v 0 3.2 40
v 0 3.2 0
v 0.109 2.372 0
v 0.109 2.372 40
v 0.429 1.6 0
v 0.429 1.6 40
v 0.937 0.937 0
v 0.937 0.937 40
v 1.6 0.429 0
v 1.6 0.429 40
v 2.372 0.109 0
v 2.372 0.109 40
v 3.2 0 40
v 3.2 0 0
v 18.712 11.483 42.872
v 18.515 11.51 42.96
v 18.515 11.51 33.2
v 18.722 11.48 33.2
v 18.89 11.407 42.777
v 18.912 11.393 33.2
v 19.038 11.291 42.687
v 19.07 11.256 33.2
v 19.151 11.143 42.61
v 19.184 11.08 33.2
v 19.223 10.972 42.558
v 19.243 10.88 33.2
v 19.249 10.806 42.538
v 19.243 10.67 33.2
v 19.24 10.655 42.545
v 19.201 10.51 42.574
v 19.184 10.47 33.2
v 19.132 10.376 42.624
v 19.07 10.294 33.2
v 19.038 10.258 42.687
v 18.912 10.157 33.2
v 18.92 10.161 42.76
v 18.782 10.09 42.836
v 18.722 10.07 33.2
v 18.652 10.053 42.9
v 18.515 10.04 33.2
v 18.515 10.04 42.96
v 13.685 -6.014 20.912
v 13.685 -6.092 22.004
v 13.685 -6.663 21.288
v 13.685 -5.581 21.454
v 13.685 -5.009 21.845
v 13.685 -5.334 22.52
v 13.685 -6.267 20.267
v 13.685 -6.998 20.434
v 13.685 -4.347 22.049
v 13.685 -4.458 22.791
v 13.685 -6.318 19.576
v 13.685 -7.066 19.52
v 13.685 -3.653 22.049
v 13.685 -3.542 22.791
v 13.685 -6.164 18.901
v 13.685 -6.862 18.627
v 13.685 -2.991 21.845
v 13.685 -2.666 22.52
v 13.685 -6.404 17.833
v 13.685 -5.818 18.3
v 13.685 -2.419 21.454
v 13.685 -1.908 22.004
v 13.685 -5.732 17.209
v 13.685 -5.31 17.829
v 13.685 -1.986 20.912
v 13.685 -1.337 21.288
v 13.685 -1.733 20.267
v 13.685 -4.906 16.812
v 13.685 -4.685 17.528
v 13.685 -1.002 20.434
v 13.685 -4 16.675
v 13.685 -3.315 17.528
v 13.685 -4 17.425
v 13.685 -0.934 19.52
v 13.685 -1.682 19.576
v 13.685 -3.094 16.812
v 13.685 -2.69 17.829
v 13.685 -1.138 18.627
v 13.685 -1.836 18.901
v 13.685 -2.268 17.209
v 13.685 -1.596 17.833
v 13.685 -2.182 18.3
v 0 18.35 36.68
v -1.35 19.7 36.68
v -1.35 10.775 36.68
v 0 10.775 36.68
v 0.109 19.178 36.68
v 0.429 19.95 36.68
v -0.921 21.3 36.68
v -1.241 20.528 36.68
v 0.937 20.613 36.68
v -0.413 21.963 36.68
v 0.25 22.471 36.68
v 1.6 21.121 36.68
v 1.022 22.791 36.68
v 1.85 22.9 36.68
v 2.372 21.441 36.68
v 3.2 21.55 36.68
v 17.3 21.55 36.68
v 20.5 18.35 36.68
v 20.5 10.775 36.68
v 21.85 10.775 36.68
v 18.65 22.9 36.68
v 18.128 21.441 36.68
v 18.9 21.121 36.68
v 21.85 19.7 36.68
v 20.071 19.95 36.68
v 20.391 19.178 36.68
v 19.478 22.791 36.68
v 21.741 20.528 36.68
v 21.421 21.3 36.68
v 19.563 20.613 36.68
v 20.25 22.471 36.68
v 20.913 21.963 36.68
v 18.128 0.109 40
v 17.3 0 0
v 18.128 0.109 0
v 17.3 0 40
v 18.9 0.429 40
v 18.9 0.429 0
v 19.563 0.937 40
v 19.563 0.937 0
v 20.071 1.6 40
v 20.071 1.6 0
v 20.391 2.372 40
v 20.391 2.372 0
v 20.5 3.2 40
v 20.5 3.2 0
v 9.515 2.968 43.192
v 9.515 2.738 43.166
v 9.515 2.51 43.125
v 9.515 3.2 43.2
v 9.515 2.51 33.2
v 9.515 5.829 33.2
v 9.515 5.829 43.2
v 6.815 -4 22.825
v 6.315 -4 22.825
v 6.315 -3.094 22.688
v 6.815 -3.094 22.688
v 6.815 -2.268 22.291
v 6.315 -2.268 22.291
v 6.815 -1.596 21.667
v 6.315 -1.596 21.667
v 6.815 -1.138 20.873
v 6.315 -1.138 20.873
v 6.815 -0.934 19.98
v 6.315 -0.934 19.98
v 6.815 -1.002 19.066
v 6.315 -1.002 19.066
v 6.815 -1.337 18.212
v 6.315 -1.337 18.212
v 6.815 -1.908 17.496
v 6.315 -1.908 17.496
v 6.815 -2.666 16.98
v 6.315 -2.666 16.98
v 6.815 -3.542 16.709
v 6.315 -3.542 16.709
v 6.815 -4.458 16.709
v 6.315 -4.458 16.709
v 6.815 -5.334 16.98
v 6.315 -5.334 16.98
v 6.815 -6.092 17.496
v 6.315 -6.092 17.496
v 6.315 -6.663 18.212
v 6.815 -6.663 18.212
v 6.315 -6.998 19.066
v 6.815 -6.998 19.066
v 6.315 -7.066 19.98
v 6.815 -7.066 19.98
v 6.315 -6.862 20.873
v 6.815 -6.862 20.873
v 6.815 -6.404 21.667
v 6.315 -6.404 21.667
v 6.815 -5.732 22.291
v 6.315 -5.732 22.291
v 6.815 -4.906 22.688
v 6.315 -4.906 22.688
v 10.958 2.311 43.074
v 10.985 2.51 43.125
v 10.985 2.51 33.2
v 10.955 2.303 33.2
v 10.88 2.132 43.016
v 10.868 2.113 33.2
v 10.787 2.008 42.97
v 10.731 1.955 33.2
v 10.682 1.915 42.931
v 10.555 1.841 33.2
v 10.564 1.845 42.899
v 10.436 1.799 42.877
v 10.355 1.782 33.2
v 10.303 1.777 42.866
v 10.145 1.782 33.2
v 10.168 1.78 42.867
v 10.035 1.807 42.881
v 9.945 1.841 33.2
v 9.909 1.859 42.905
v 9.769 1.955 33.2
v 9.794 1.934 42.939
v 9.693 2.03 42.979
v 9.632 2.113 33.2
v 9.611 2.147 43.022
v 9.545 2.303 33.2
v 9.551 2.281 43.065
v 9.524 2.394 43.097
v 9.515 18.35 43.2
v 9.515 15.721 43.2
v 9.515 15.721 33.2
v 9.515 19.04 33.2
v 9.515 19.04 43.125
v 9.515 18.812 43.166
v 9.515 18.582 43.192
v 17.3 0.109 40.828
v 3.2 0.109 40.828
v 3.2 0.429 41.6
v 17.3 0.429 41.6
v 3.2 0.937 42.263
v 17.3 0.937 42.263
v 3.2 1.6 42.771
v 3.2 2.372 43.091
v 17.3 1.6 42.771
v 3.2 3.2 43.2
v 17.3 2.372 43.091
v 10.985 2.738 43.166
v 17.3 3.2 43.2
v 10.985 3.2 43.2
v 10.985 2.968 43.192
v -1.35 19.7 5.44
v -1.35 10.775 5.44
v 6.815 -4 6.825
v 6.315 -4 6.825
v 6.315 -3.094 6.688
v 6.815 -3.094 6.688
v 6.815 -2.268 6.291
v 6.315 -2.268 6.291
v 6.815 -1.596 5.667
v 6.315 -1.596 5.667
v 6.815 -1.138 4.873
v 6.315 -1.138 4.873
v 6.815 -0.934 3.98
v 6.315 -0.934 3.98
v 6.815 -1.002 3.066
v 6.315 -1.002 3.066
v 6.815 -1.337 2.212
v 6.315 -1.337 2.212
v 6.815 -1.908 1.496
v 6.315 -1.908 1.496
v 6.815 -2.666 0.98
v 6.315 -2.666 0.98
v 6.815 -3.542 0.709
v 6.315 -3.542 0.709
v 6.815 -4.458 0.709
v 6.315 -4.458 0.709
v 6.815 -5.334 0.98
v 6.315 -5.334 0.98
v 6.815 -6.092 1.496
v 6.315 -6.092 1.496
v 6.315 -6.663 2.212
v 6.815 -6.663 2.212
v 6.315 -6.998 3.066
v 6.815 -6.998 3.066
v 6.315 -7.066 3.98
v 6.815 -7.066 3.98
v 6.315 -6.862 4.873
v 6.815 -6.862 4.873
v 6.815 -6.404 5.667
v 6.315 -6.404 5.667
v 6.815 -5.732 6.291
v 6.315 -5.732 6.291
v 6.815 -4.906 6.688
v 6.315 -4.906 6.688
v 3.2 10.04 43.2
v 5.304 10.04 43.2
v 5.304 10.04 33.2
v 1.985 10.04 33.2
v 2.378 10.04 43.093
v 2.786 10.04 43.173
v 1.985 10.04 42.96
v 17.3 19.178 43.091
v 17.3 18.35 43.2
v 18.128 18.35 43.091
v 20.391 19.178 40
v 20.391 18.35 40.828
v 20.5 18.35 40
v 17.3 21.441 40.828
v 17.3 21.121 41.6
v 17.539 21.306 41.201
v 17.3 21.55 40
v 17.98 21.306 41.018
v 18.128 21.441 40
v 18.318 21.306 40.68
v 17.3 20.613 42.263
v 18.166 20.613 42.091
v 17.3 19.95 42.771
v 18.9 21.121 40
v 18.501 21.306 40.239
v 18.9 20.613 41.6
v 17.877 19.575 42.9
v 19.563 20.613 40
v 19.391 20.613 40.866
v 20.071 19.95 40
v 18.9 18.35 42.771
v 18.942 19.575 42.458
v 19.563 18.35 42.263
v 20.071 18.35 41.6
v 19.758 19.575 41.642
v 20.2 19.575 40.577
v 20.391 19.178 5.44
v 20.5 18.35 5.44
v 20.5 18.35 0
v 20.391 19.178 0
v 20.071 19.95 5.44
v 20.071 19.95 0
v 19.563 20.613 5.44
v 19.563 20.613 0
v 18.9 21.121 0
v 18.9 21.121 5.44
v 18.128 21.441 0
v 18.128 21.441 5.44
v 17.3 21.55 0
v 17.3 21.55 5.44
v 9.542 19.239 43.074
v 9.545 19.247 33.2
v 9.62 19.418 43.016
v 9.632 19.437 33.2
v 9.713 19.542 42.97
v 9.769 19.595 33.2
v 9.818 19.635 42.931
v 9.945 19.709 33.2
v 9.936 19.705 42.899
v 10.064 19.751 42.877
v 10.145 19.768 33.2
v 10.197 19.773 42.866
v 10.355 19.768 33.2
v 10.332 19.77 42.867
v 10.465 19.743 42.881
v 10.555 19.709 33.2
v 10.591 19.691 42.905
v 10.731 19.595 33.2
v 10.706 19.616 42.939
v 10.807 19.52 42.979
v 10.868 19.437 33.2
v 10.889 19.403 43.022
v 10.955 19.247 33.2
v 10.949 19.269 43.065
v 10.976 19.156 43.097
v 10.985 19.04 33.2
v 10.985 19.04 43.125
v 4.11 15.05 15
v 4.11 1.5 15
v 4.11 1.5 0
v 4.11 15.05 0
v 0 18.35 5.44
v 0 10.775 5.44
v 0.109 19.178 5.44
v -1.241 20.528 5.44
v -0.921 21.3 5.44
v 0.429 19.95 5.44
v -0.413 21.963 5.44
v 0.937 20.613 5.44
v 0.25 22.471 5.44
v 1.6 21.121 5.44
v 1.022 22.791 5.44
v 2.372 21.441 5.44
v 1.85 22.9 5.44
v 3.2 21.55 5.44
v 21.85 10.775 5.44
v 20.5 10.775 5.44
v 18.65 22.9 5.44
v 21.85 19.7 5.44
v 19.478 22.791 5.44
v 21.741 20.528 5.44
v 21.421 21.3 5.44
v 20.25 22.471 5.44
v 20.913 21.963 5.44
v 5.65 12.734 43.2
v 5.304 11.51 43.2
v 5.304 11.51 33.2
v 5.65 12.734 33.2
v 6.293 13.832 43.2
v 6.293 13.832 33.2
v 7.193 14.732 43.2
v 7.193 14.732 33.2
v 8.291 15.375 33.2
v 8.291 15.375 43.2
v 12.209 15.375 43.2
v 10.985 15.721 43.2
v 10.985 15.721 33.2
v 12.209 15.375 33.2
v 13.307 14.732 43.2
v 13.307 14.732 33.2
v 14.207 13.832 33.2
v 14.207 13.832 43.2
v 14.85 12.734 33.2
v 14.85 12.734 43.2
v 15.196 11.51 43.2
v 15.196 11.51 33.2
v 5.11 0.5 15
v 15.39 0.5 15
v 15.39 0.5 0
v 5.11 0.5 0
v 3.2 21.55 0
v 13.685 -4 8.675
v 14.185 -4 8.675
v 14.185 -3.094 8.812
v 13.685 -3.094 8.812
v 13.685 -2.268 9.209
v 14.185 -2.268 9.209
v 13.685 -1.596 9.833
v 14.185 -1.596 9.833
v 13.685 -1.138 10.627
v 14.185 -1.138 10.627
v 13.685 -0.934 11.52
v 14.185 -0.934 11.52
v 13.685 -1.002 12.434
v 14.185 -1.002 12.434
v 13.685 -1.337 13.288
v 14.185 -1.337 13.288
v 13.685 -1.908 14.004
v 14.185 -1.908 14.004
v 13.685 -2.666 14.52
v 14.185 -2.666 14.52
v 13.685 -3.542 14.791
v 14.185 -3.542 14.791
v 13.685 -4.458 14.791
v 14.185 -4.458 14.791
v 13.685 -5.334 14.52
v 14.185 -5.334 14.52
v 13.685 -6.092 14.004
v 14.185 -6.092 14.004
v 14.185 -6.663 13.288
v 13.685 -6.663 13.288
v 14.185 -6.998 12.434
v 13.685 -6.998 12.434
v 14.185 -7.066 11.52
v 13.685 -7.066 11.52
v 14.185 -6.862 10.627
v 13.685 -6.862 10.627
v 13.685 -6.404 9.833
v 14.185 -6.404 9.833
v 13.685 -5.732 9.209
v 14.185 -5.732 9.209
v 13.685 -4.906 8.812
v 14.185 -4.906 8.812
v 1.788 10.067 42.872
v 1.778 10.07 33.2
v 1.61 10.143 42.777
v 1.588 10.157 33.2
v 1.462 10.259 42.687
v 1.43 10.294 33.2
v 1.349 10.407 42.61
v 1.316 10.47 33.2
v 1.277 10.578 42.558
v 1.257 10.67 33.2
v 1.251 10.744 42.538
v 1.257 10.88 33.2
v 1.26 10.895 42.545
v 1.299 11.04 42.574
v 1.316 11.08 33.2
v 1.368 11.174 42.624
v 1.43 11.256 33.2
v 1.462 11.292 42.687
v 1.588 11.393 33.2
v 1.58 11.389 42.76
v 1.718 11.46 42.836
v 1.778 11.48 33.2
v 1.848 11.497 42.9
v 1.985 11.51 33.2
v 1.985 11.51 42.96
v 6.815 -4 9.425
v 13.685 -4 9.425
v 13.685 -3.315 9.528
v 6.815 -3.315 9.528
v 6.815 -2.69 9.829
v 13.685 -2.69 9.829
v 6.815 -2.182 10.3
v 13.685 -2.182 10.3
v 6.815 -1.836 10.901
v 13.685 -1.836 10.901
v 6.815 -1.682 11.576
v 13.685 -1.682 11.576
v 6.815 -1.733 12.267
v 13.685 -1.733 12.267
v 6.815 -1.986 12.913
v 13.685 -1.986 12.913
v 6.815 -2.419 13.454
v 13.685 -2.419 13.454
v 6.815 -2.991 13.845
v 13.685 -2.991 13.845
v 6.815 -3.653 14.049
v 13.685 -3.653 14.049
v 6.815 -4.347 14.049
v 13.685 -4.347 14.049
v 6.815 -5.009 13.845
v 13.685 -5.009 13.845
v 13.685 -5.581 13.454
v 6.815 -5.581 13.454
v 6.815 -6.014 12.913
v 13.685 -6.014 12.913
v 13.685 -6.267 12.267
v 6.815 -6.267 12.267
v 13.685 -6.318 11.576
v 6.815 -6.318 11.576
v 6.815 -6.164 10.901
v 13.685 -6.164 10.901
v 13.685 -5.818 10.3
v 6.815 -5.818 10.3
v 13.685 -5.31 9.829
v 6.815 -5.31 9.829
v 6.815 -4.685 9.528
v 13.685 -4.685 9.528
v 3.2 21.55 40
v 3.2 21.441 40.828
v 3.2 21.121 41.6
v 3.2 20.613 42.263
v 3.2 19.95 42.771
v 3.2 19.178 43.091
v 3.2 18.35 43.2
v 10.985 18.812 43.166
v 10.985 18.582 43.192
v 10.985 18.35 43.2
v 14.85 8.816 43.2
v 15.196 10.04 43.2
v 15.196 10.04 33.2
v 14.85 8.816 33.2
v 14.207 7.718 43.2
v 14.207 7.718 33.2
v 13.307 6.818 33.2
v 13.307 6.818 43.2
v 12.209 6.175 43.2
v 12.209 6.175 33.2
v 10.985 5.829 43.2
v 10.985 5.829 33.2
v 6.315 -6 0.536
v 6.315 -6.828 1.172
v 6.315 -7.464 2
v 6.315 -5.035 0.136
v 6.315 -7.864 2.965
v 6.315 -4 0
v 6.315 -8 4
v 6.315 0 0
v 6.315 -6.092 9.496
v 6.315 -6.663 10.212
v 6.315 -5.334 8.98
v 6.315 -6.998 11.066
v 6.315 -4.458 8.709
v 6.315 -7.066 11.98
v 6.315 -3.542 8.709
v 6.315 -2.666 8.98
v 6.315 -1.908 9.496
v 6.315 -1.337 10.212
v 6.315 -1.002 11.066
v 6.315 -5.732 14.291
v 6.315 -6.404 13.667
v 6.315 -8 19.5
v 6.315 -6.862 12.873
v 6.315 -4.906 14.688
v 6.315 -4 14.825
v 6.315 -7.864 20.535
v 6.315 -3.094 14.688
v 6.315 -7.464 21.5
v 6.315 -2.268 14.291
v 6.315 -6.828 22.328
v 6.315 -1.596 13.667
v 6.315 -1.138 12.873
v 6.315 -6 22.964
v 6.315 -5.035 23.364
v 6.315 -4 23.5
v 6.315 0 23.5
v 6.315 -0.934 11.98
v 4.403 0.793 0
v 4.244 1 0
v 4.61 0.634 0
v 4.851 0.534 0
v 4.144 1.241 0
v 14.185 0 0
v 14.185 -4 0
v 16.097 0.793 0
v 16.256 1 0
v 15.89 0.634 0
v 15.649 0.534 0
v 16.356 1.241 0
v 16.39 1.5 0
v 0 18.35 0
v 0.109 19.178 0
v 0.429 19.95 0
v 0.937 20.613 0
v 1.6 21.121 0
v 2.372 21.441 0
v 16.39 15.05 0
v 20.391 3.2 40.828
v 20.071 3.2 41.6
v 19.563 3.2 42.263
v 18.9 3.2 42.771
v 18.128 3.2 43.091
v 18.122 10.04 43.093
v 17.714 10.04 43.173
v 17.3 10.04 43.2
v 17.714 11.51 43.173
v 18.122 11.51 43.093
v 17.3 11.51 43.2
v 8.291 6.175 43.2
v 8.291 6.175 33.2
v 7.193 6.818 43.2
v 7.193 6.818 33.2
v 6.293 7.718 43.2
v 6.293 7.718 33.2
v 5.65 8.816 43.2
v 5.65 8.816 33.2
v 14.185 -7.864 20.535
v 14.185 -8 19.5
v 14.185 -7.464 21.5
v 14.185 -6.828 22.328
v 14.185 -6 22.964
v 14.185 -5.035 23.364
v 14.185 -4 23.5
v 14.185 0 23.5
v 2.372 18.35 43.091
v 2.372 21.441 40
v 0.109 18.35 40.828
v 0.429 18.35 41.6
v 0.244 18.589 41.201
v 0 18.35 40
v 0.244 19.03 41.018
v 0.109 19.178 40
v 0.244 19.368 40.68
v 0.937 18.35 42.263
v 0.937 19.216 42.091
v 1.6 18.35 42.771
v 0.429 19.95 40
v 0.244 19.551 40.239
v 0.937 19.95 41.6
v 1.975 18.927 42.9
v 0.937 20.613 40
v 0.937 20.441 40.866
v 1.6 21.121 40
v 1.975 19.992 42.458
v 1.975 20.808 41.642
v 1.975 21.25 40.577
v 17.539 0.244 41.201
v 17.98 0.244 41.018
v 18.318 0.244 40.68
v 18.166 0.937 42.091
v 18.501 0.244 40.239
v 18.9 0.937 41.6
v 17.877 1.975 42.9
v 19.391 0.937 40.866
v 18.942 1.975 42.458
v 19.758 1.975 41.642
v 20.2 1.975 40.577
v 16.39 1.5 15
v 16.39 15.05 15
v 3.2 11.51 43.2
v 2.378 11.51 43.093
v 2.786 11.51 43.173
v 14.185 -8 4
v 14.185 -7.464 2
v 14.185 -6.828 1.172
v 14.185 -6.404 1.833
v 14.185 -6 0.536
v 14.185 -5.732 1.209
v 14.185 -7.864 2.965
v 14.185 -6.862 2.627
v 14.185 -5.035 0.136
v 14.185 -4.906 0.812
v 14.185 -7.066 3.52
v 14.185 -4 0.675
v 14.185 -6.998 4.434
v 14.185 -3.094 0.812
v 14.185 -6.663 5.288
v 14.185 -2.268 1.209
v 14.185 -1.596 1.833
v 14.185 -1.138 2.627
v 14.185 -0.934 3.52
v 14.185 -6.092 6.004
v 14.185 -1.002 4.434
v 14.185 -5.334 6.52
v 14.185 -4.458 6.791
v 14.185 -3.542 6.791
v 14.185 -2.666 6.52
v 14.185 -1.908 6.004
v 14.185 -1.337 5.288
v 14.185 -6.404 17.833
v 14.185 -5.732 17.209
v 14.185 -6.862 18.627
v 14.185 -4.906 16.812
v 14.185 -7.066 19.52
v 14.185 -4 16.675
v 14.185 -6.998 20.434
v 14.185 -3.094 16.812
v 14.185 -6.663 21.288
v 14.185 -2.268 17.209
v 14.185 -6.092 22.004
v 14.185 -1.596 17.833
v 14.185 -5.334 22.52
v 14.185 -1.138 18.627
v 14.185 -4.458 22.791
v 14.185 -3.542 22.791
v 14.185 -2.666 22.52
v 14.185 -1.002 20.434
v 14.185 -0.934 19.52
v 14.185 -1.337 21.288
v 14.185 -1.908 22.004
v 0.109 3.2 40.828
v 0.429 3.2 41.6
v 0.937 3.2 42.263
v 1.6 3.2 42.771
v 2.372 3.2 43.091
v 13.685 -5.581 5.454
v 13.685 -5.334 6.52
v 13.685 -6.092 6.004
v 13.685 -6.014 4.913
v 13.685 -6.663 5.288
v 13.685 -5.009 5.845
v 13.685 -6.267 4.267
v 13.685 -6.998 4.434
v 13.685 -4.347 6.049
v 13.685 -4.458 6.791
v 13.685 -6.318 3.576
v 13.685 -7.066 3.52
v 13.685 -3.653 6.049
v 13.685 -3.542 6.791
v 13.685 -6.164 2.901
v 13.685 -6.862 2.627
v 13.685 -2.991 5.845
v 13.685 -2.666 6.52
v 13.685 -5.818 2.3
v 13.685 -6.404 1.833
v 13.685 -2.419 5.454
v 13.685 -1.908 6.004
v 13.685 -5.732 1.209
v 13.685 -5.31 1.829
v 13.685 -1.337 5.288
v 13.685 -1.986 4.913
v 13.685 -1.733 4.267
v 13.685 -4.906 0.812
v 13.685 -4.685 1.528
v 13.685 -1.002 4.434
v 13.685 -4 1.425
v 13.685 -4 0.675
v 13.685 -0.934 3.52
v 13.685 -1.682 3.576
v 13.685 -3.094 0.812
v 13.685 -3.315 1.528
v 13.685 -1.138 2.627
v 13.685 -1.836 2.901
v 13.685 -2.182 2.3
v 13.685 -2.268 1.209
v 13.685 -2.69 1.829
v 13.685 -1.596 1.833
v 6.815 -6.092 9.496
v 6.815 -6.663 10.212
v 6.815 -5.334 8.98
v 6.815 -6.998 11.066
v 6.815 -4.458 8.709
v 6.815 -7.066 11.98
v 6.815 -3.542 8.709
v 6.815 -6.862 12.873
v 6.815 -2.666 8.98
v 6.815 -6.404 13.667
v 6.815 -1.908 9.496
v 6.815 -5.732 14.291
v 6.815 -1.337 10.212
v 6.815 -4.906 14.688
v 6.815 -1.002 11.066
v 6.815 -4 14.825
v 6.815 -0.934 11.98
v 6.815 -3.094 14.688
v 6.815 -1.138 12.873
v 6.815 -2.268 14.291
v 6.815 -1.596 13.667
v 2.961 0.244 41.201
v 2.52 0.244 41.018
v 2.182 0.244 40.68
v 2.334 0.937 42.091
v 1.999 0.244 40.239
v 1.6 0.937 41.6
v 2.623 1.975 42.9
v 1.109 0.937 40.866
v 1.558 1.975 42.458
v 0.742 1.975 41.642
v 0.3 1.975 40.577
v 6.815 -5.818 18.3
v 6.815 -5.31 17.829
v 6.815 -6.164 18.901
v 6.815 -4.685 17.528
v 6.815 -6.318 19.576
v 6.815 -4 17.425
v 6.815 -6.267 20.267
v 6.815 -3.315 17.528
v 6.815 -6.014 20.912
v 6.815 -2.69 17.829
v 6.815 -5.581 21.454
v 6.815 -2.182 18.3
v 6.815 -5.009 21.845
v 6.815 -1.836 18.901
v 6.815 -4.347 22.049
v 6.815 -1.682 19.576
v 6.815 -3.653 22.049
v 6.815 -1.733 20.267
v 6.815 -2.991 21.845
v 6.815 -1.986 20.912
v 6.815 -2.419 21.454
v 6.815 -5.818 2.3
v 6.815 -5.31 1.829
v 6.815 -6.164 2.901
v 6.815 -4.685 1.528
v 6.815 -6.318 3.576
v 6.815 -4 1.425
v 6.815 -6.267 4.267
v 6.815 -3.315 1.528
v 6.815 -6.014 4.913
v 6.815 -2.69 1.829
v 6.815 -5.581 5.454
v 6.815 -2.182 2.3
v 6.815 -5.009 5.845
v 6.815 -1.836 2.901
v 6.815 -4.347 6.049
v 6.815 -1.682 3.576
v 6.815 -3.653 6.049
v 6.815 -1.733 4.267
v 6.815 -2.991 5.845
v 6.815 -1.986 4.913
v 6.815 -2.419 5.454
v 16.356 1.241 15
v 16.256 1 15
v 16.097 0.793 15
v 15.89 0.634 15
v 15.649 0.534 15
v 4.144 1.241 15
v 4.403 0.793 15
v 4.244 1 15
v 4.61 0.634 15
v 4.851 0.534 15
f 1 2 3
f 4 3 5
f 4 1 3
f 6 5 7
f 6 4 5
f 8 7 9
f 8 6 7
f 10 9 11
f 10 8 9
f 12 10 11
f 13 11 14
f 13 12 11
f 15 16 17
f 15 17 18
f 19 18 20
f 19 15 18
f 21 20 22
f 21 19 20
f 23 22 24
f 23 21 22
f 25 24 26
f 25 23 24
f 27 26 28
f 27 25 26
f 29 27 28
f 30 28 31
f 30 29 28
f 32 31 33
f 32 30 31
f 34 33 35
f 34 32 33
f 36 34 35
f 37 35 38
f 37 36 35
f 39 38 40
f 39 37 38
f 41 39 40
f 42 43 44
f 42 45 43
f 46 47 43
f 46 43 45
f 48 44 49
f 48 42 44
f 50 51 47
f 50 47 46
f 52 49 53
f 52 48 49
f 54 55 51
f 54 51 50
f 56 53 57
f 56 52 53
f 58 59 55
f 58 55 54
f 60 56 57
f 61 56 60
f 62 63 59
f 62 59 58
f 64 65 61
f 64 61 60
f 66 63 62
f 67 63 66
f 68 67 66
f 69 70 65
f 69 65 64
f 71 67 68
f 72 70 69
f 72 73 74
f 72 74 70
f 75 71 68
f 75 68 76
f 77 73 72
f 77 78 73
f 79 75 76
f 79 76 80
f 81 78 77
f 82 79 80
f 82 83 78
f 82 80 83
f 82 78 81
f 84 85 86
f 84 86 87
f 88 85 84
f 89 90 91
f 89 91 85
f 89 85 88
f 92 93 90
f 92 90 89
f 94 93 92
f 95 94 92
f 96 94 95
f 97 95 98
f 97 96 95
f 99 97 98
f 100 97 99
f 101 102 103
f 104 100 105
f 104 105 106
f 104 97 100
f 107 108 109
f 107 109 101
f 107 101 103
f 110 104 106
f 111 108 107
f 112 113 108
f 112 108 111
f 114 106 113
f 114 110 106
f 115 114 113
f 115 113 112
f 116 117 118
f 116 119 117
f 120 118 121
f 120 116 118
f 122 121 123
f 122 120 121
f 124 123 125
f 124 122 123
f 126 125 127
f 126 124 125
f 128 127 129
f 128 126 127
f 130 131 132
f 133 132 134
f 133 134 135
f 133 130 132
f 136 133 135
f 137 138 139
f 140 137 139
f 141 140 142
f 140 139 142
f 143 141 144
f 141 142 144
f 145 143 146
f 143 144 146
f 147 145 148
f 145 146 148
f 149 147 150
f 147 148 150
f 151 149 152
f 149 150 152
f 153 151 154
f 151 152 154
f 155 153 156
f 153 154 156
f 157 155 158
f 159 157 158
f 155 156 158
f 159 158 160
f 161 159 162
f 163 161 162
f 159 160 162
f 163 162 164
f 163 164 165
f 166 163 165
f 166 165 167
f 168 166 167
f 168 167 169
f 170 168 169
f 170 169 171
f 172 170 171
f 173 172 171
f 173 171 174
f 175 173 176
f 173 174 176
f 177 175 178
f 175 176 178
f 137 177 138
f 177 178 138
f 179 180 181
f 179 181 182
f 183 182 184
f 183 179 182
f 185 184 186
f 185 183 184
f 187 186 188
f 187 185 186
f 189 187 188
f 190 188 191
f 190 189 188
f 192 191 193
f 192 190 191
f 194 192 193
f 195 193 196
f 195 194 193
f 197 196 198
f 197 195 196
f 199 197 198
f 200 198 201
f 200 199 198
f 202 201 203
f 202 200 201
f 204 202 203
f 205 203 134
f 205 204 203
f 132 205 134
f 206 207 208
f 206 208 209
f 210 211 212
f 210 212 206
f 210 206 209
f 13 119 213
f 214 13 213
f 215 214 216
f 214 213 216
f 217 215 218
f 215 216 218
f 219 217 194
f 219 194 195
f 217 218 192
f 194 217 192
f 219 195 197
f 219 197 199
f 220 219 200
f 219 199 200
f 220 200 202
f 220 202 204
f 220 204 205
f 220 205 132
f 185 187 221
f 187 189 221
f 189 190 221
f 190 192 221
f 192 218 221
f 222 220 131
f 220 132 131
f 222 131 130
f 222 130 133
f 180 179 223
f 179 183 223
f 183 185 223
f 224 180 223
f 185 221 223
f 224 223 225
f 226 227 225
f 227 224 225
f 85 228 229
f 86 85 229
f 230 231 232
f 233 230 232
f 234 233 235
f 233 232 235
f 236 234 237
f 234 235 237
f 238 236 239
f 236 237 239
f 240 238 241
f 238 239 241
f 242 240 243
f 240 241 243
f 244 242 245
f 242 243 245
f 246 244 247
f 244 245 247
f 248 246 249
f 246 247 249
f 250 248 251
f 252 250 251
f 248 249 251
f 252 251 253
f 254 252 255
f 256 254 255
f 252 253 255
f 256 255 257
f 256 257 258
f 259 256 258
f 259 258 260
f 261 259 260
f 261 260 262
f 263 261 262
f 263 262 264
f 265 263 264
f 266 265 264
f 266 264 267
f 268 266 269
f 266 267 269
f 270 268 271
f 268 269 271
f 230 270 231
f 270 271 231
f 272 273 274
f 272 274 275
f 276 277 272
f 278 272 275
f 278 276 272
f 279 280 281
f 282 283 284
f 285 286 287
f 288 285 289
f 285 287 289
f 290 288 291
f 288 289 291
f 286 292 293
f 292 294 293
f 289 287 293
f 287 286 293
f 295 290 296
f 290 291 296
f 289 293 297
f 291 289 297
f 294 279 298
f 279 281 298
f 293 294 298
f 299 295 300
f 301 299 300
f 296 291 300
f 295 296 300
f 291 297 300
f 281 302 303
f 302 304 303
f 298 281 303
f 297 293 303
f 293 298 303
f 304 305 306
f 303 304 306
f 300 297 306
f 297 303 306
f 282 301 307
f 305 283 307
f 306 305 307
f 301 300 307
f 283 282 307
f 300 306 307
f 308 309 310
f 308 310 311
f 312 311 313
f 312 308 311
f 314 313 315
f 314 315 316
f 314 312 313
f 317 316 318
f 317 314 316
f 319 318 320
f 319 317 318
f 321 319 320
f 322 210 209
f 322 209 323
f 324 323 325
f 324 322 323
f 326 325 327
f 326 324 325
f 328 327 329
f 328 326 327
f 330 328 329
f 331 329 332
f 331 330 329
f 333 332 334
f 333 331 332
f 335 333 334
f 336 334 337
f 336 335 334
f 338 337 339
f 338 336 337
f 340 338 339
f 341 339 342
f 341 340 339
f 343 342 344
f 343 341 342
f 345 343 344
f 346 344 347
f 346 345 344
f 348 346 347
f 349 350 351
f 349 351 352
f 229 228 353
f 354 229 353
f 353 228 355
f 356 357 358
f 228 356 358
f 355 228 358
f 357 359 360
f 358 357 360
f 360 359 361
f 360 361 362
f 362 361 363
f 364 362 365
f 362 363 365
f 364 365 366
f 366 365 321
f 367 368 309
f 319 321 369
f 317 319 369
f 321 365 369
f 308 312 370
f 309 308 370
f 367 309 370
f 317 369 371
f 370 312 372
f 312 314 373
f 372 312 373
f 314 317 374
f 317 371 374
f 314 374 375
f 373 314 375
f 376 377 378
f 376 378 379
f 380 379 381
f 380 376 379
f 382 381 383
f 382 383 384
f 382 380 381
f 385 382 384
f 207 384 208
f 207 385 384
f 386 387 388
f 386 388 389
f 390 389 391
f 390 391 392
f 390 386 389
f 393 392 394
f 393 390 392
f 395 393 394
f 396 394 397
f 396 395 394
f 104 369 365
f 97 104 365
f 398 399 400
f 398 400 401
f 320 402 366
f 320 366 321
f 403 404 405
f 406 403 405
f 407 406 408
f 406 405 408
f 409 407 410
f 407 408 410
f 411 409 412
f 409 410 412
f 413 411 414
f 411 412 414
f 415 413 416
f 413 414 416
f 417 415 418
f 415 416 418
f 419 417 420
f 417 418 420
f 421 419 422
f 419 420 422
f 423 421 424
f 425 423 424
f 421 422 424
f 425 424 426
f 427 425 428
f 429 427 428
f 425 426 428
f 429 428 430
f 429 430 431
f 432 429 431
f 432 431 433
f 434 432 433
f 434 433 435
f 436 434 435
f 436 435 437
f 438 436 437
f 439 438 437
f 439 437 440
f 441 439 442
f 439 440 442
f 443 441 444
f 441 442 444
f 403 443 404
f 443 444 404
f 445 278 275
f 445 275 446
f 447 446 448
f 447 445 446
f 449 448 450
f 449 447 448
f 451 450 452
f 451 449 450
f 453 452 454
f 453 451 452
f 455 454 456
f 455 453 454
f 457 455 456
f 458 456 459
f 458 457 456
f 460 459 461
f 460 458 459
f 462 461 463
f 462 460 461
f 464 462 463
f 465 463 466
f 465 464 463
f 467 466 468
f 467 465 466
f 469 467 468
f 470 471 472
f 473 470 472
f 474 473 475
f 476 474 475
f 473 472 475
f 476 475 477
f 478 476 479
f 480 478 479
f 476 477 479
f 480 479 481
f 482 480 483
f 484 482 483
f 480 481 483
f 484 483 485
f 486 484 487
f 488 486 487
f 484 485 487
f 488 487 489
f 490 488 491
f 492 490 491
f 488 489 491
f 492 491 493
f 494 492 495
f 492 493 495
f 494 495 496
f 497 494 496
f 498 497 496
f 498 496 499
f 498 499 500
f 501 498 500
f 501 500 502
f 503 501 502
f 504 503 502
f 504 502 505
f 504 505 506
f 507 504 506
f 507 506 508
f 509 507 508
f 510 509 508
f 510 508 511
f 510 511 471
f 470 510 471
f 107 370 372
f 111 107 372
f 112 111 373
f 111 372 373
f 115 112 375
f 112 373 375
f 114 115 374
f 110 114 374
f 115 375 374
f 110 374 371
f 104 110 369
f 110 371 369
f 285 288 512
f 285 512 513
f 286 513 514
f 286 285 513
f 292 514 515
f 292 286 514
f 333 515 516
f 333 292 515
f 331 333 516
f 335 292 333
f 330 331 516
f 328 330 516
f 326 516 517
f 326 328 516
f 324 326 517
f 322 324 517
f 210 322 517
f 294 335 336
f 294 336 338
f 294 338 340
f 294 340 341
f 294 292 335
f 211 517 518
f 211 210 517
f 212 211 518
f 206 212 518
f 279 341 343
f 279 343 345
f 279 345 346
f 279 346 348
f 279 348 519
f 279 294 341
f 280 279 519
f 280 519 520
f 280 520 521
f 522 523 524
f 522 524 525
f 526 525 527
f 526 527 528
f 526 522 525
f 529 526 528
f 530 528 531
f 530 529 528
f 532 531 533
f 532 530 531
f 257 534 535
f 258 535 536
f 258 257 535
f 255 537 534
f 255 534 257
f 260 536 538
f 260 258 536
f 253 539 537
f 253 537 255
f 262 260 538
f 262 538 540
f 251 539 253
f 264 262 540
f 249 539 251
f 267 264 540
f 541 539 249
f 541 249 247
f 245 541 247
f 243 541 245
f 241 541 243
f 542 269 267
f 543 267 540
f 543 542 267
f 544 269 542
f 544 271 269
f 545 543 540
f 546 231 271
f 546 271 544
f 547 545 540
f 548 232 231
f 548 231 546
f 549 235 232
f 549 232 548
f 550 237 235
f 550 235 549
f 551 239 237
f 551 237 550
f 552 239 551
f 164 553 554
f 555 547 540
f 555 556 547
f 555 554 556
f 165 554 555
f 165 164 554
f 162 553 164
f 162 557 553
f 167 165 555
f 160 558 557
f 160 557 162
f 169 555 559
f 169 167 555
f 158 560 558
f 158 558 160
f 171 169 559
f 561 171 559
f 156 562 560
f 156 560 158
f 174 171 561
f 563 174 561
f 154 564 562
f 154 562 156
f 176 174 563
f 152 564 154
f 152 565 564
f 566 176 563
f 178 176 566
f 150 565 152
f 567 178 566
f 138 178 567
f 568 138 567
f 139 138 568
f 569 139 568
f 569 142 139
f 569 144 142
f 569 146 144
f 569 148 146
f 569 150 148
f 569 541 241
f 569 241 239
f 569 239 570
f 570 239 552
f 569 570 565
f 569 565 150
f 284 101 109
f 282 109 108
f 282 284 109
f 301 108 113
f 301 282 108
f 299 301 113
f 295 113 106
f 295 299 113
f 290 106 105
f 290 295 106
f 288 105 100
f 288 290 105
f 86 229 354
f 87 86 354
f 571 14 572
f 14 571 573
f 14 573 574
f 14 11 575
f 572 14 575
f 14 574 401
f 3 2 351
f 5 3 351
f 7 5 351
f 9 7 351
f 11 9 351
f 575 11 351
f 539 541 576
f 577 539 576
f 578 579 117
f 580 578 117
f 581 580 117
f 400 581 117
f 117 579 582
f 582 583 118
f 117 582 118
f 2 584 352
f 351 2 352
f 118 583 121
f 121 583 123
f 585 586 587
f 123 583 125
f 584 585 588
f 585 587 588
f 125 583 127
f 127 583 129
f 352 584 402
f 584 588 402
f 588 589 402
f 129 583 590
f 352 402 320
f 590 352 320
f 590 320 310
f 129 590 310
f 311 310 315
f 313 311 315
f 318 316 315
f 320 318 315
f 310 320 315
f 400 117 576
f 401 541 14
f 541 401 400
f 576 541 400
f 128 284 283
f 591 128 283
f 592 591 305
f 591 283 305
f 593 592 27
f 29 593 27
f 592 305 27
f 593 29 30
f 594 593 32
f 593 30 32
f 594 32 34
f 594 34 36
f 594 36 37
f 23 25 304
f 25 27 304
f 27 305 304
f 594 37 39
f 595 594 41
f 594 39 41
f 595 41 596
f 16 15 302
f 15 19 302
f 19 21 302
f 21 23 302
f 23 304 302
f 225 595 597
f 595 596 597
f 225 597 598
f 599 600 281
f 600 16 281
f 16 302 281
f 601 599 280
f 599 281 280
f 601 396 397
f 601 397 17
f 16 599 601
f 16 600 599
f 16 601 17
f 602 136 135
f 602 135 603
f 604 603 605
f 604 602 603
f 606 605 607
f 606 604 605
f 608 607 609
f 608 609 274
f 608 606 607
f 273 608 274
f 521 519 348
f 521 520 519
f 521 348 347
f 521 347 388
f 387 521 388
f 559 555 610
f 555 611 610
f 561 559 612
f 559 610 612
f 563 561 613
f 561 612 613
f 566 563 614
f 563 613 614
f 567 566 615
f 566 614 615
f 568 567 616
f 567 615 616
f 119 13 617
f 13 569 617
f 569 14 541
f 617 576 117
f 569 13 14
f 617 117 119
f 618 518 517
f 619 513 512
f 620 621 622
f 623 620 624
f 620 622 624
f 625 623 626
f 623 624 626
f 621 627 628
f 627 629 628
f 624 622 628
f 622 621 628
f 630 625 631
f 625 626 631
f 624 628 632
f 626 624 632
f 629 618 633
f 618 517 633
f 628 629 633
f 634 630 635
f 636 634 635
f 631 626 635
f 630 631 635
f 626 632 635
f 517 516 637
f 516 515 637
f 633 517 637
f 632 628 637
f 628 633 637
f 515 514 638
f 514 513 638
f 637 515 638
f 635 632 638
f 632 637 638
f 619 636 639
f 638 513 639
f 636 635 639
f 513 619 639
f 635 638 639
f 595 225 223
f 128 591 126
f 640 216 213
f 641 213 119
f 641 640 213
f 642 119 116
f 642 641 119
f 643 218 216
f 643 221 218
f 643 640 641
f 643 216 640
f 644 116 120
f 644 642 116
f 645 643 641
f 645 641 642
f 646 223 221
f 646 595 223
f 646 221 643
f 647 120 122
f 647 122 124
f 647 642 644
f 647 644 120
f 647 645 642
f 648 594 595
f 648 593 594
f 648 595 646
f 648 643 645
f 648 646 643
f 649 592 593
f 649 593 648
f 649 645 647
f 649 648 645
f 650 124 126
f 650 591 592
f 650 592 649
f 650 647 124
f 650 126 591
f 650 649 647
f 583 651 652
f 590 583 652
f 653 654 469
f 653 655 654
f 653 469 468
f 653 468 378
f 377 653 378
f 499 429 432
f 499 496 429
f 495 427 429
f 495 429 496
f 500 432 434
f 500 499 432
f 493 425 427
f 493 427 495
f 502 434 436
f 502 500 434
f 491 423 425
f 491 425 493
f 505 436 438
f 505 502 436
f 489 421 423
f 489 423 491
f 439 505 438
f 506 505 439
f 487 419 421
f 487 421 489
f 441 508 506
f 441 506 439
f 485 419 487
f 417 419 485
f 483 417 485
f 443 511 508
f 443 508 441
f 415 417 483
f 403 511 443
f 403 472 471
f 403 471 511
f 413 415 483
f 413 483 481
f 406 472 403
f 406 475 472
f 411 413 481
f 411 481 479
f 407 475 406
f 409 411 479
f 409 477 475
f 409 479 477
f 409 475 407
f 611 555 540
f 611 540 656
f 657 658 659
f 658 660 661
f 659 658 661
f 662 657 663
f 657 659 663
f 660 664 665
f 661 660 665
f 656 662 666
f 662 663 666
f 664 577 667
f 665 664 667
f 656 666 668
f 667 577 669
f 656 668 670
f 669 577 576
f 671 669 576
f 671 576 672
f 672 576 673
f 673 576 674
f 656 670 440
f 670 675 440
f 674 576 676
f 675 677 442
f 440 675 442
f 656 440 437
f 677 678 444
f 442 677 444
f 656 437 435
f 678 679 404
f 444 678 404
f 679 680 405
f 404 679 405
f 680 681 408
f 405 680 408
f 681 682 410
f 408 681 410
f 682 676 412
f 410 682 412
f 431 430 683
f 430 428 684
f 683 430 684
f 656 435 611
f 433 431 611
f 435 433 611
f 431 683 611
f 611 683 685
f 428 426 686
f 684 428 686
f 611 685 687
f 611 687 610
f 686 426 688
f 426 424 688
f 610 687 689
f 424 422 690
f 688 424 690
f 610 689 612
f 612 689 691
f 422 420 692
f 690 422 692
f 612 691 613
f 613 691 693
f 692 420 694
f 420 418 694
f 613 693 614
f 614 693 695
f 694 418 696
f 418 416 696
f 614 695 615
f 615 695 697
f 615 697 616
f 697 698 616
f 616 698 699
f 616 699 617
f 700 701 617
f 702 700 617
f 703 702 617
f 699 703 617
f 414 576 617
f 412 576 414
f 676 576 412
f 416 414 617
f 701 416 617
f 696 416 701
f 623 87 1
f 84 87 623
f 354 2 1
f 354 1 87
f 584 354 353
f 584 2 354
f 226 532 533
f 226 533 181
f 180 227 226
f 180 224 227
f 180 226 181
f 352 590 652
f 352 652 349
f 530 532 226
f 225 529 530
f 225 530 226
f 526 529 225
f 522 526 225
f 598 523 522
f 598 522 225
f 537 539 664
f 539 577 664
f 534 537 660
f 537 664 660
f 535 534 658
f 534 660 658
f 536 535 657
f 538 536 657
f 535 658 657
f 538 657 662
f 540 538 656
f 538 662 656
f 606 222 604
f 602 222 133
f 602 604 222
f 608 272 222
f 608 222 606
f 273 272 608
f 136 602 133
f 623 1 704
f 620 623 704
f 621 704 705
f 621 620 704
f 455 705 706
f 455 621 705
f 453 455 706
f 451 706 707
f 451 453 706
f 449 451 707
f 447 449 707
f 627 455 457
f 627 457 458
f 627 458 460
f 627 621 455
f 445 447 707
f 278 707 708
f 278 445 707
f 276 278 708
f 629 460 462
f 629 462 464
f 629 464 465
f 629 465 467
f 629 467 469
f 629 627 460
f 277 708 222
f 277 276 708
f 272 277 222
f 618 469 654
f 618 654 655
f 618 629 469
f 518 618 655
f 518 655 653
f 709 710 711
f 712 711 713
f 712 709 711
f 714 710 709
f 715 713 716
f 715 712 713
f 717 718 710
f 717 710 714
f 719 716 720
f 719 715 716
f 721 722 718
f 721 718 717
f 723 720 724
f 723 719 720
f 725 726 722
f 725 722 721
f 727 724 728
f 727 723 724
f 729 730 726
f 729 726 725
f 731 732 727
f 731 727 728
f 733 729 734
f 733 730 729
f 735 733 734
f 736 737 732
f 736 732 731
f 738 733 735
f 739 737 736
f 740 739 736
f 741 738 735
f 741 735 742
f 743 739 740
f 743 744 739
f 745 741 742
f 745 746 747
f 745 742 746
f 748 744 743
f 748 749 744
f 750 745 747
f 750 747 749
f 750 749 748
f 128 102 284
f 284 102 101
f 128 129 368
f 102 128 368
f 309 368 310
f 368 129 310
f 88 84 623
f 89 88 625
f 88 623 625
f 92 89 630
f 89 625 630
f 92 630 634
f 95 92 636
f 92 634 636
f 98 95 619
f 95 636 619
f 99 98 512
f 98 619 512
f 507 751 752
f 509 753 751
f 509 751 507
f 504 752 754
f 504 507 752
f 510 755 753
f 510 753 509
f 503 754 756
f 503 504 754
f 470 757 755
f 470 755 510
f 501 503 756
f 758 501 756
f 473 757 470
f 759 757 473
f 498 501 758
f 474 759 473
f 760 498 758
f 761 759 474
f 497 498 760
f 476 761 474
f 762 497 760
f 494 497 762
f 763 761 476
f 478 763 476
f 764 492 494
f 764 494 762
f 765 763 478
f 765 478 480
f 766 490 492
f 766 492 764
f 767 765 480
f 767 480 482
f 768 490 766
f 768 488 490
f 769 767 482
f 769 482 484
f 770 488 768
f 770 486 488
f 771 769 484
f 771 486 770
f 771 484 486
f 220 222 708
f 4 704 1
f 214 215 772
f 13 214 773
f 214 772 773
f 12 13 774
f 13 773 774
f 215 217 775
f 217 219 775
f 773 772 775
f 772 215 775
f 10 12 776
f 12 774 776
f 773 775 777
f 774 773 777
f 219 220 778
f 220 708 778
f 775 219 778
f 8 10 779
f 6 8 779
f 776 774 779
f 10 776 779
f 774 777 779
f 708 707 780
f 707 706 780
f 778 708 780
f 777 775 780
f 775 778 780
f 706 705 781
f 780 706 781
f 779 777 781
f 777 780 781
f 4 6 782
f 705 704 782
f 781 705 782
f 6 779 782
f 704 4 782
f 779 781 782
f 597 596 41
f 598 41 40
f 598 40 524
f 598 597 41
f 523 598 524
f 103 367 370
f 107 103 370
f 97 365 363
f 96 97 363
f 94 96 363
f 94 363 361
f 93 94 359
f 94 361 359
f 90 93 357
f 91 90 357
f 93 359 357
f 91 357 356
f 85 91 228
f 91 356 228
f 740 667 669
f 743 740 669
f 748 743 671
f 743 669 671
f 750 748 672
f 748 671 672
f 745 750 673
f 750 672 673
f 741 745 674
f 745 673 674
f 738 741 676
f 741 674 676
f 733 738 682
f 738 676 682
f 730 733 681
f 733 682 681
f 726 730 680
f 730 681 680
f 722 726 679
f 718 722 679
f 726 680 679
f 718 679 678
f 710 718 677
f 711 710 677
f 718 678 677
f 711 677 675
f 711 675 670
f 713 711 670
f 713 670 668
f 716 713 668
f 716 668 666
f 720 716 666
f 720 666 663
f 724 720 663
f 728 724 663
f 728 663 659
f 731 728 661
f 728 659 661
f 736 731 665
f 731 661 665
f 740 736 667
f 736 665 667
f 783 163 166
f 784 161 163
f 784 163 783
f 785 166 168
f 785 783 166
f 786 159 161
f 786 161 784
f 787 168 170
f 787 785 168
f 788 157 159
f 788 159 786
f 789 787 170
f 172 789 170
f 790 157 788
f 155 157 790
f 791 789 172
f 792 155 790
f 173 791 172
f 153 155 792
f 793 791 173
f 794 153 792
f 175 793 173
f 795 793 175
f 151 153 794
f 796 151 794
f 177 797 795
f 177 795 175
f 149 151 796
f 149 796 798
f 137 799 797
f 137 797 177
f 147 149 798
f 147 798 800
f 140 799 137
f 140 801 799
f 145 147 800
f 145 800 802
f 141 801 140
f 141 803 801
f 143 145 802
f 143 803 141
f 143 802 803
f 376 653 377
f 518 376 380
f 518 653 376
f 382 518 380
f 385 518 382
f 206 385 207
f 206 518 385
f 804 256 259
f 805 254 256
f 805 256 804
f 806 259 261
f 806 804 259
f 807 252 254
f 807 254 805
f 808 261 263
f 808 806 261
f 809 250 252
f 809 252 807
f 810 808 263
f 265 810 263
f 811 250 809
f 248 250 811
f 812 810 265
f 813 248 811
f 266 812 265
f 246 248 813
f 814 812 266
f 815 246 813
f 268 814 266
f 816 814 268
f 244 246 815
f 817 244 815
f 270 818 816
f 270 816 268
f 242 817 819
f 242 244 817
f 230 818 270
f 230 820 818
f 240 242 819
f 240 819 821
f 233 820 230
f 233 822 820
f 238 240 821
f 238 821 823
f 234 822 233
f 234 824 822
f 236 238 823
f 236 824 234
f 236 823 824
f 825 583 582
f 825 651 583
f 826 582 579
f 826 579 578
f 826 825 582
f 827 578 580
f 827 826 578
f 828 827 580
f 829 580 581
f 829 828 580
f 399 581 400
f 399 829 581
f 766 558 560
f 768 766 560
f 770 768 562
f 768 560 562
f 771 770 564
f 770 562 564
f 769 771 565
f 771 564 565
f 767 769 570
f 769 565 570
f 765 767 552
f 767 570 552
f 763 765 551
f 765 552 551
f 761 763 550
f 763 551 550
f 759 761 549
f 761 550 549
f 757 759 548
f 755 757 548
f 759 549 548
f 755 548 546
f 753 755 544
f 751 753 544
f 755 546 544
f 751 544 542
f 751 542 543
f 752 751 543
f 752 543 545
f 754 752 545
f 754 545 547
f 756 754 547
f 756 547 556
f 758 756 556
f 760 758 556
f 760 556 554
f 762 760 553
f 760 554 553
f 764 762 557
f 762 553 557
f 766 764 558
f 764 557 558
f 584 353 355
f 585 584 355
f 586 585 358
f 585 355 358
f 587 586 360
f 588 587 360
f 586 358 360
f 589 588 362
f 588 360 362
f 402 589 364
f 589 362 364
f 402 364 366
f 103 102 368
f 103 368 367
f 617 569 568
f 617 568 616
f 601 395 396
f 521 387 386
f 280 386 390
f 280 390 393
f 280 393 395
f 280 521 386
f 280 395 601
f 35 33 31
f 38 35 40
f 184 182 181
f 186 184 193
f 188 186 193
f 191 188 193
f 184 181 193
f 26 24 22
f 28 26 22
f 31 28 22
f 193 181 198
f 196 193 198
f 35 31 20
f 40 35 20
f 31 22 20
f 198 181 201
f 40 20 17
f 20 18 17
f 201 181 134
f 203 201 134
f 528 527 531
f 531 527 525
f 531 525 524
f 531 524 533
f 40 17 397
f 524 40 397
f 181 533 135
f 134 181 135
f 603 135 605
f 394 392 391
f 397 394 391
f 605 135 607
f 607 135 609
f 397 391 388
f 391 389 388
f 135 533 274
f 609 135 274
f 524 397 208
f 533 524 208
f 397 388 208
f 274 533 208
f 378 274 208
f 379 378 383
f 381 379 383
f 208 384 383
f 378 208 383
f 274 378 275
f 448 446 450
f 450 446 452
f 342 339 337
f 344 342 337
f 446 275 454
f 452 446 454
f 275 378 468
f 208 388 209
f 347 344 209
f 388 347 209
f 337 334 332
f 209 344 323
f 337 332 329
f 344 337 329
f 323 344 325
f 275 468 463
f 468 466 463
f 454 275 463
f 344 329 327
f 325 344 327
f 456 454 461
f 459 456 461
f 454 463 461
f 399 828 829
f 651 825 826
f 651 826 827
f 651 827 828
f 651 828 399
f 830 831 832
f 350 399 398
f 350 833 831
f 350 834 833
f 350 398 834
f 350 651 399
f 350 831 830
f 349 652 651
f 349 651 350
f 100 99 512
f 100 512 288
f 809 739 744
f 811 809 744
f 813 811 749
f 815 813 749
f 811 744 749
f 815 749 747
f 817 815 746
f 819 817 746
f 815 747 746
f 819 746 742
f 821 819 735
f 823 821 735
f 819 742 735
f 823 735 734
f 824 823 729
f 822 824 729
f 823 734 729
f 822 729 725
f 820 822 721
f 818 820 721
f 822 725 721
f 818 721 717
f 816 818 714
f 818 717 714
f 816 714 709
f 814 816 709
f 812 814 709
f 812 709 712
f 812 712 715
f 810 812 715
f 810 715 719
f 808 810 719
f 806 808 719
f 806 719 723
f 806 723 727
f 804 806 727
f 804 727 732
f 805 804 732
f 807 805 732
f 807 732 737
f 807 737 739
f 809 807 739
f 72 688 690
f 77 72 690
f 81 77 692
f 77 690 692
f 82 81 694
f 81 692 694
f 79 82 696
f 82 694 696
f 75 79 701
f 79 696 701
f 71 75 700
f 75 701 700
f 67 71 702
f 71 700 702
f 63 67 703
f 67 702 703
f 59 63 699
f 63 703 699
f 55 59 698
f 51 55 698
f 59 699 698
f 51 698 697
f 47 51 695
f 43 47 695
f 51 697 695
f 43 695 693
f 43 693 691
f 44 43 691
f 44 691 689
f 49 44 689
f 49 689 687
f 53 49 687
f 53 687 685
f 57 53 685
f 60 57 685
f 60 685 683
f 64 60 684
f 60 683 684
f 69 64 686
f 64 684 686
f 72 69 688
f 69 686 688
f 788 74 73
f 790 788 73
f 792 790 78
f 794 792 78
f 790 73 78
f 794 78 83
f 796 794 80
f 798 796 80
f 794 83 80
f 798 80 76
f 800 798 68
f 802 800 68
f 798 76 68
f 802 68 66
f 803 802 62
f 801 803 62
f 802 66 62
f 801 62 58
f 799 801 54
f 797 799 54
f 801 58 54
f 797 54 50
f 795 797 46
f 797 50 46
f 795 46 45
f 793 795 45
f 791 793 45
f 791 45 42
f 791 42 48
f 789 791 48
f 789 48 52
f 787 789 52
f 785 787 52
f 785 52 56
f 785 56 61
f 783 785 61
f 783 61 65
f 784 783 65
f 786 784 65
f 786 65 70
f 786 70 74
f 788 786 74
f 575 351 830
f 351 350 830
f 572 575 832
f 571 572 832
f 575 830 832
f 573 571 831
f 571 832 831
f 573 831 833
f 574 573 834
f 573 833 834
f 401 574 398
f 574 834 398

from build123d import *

# Parameters (mm, degrees)
SKETCH1_W           = 20.5
SKETCH1_H           = 21.55
BOSS_EXTRUDE1_DEPTH = 43.2
FILLET1_R           = 3.2
BOSS_EXTRUDE2_DEPTH = 31.24
CUT_EXTRUDE1_DEPTH  = 10
SKETCH4_W           = 7.87
SKETCH4_H           = 23.5
BOSS_EXTRUDE3_DEPTH = 8
CUT_EXTRUDE2_REACH  = 17.535
SKETCH5_R           = 2.325
SKETCH7_R           = 3.075
CUT_EXTRUDE3_DEPTH  = 0.5
SKETCH8_R           = 3.075
CUT_EXTRUDE5_DEPTH  = 0.5
FILLET2_R           = 4
SKETCH9_W           = 12.28
SKETCH9_H           = 14.55
CUT_EXTRUDE6_DEPTH  = 15
FILLET3_R           = 1


with BuildPart() as part:
    # Sketch1 → Boss-Extrude1 (new body)
    with BuildSketch(Plane.XY):
        with Locations((10.25, 10.775)):
            Rectangle(SKETCH1_W, SKETCH1_H)
    extrude(amount=BOSS_EXTRUDE1_DEPTH)

    # Fillet1
    fillet1_edges = [part.edges().sort_by_distance(p)[0] for p in [
        (20.5, 10.775, 43.2),
        (10.25, 21.55, 43.2),
        (0, 10.775, 43.2),
        (10.25, 0, 43.2),
        (0, 21.55, 21.6),
        (20.5, 21.55, 21.6),
        (20.5, 0, 21.6),
        (0, 0, 21.6),
    ]]
    fillet(fillet1_edges, radius=FILLET1_R)

    # Sketch2 → Boss-Extrude2 (add)
    with BuildSketch(Plane(origin=(0, 0, 5.44), x_dir=(-1, 0, 0), z_dir=(0, 0, -1))):
        with BuildLine():
            Line((-20.5, 10.775), (-21.85, 10.775))
            Line((-21.85, 10.775), (-21.85, 19.7))
            ThreePointArc((-21.85, 19.7), (-20.9127417, 21.9627417), (-18.65, 22.9))
            Line((-18.65, 22.9), (-1.85, 22.9))
            ThreePointArc((-1.85, 22.9), (0.4127417, 21.9627417), (1.35, 19.7))
            Line((1.35, 19.7), (1.35, 10.775))
            Line((1.35, 10.775), (0, 10.775))
            Line((0, 10.775), (0, 18.35))
            ThreePointArc((0, 18.35), (-0.9372583, 20.6127417), (-3.2, 21.55))
            Line((-3.2, 21.55), (-17.3, 21.55))
            ThreePointArc((-17.3, 21.55), (-19.5627417, 20.6127417), (-20.5, 18.35))
            Line((-20.5, 18.35), (-20.5, 10.775))
        make_face()
    extrude(amount=-BOSS_EXTRUDE2_DEPTH)

    # Sketch3 → Cut-Extrude1 (cut)
    with BuildSketch(Plane.XY.offset(43.2)):
        with BuildLine():
            Line((15.19568246, 11.51), (18.515, 11.51))
            ThreePointArc((18.515, 11.51), (19.25, 10.775), (18.515, 10.04))
            Line((18.515, 10.04), (15.19568246, 10.04))
            ThreePointArc((15.19568246, 10.04), (13.785533906, 7.239466094), (10.985, 5.82931754))
            Line((10.985, 5.82931754), (10.985, 2.51))
            ThreePointArc((10.985, 2.51), (10.25, 1.775), (9.515, 2.51))
            Line((9.515, 2.51), (9.515, 5.82931754))
            ThreePointArc((9.515, 5.82931754), (6.714466094, 7.239466094), (5.30431754, 10.04))
            Line((5.30431754, 10.04), (1.985, 10.04))
            ThreePointArc((1.985, 10.04), (1.25, 10.775), (1.985, 11.51))
            Line((1.985, 11.51), (5.30431754, 11.51))
            ThreePointArc((5.30431754, 11.51), (6.714466094, 14.310533906), (9.515, 15.72068246))
            Line((9.515, 15.72068246), (9.515, 19.04))
            ThreePointArc((9.515, 19.04), (10.25, 19.775), (10.985, 19.04))
            Line((10.985, 19.04), (10.985, 15.72068246))
            ThreePointArc((10.985, 15.72068246), (13.785533906, 14.310533906), (15.19568246, 11.51))
        make_face()
    extrude(amount=-CUT_EXTRUDE1_DEPTH, mode=Mode.SUBTRACT)

    # Sketch4 → Boss-Extrude3 (add)
    with BuildSketch(Plane.XZ):
        with Locations((10.25, 11.75)):
            Rectangle(SKETCH4_W, SKETCH4_H)
    extrude(amount=BOSS_EXTRUDE3_DEPTH)

    # Sketch5 → Cut-Extrude2 (cut, up to next)
    with BuildSketch(Plane(origin=(14.185, 0, 0), x_dir=(0, 0, -1), z_dir=(1, 0, 0)), mode=Mode.PRIVATE) as cut_extrude2_sk1:
        with Locations((-19.75, -4)):
            Circle(SKETCH5_R)
    cut_extrude2_tool1 = extrude(cut_extrude2_sk1.sketch, amount=-CUT_EXTRUDE2_REACH, mode=Mode.PRIVATE) & part.part
    add(cut_extrude2_tool1.solids().sort_by_distance((14.185, -4, 19.75))[0], mode=Mode.SUBTRACT)
    # Sketch5 → Cut-Extrude2 (cut, up to next)
    with BuildSketch(Plane(origin=(14.185, 0, 0), x_dir=(0, 0, -1), z_dir=(1, 0, 0)), mode=Mode.PRIVATE) as cut_extrude2_sk2:
        with Locations((-11.75, -4)):
            Circle(SKETCH5_R)
    cut_extrude2_tool2 = extrude(cut_extrude2_sk2.sketch, amount=-CUT_EXTRUDE2_REACH, mode=Mode.PRIVATE) & part.part
    add(cut_extrude2_tool2.solids().sort_by_distance((14.185, -4, 11.75))[0], mode=Mode.SUBTRACT)
    # Sketch5 → Cut-Extrude2 (cut, up to next)
    with BuildSketch(Plane(origin=(14.185, 0, 0), x_dir=(0, 0, -1), z_dir=(1, 0, 0)), mode=Mode.PRIVATE) as cut_extrude2_sk3:
        with Locations((-3.75, -4)):
            Circle(SKETCH5_R)
    cut_extrude2_tool3 = extrude(cut_extrude2_sk3.sketch, amount=-CUT_EXTRUDE2_REACH, mode=Mode.PRIVATE) & part.part
    add(cut_extrude2_tool3.solids().sort_by_distance((14.185, -4, 3.75))[0], mode=Mode.SUBTRACT)

    # Sketch7 → Cut-Extrude3 (cut)
    with BuildSketch(Plane(origin=(14.185, 0, 0), x_dir=(0, 0, -1), z_dir=(1, 0, 0))):
        with Locations((-19.75, -4)):
            Circle(SKETCH7_R)
        with Locations((-11.75, -4)):
            Circle(SKETCH7_R)
        with Locations((-3.75, -4)):
            Circle(SKETCH7_R)
    extrude(amount=-CUT_EXTRUDE3_DEPTH, mode=Mode.SUBTRACT)

    # Sketch8 → Cut-Extrude5 (cut)
    with BuildSketch(Plane.ZY.offset(-6.315)):
        with Locations((3.75, -4)):
            Circle(SKETCH8_R)
        with Locations((11.75, -4)):
            Circle(SKETCH8_R)
        with Locations((19.75, -4)):
            Circle(SKETCH8_R)
    extrude(amount=-CUT_EXTRUDE5_DEPTH, mode=Mode.SUBTRACT)

    # Fillet2
    fillet2_edges = [part.edges().sort_by_distance(p)[0] for p in [
        (10.25, -8, 0),
        (10.25, -8, 23.5),
    ]]
    fillet(fillet2_edges, radius=FILLET2_R)

    # Sketch9 → Cut-Extrude6 (cut)
    with BuildSketch(Plane(origin=(0, 0, 0), x_dir=(-1, 0, 0), z_dir=(0, 0, -1))):
        with Locations((-10.25, 7.775)):
            Rectangle(SKETCH9_W, SKETCH9_H)
    extrude(amount=-CUT_EXTRUDE6_DEPTH, mode=Mode.SUBTRACT)

    # Fillet3
    fillet3_edges = [part.edges().sort_by_distance(p)[0] for p in [
        (16.39, 0.5, 7.5),
        (4.11, 0.5, 7.5),
    ]]
    fillet(fillet3_edges, radius=FILLET3_R)


solid = part.part
